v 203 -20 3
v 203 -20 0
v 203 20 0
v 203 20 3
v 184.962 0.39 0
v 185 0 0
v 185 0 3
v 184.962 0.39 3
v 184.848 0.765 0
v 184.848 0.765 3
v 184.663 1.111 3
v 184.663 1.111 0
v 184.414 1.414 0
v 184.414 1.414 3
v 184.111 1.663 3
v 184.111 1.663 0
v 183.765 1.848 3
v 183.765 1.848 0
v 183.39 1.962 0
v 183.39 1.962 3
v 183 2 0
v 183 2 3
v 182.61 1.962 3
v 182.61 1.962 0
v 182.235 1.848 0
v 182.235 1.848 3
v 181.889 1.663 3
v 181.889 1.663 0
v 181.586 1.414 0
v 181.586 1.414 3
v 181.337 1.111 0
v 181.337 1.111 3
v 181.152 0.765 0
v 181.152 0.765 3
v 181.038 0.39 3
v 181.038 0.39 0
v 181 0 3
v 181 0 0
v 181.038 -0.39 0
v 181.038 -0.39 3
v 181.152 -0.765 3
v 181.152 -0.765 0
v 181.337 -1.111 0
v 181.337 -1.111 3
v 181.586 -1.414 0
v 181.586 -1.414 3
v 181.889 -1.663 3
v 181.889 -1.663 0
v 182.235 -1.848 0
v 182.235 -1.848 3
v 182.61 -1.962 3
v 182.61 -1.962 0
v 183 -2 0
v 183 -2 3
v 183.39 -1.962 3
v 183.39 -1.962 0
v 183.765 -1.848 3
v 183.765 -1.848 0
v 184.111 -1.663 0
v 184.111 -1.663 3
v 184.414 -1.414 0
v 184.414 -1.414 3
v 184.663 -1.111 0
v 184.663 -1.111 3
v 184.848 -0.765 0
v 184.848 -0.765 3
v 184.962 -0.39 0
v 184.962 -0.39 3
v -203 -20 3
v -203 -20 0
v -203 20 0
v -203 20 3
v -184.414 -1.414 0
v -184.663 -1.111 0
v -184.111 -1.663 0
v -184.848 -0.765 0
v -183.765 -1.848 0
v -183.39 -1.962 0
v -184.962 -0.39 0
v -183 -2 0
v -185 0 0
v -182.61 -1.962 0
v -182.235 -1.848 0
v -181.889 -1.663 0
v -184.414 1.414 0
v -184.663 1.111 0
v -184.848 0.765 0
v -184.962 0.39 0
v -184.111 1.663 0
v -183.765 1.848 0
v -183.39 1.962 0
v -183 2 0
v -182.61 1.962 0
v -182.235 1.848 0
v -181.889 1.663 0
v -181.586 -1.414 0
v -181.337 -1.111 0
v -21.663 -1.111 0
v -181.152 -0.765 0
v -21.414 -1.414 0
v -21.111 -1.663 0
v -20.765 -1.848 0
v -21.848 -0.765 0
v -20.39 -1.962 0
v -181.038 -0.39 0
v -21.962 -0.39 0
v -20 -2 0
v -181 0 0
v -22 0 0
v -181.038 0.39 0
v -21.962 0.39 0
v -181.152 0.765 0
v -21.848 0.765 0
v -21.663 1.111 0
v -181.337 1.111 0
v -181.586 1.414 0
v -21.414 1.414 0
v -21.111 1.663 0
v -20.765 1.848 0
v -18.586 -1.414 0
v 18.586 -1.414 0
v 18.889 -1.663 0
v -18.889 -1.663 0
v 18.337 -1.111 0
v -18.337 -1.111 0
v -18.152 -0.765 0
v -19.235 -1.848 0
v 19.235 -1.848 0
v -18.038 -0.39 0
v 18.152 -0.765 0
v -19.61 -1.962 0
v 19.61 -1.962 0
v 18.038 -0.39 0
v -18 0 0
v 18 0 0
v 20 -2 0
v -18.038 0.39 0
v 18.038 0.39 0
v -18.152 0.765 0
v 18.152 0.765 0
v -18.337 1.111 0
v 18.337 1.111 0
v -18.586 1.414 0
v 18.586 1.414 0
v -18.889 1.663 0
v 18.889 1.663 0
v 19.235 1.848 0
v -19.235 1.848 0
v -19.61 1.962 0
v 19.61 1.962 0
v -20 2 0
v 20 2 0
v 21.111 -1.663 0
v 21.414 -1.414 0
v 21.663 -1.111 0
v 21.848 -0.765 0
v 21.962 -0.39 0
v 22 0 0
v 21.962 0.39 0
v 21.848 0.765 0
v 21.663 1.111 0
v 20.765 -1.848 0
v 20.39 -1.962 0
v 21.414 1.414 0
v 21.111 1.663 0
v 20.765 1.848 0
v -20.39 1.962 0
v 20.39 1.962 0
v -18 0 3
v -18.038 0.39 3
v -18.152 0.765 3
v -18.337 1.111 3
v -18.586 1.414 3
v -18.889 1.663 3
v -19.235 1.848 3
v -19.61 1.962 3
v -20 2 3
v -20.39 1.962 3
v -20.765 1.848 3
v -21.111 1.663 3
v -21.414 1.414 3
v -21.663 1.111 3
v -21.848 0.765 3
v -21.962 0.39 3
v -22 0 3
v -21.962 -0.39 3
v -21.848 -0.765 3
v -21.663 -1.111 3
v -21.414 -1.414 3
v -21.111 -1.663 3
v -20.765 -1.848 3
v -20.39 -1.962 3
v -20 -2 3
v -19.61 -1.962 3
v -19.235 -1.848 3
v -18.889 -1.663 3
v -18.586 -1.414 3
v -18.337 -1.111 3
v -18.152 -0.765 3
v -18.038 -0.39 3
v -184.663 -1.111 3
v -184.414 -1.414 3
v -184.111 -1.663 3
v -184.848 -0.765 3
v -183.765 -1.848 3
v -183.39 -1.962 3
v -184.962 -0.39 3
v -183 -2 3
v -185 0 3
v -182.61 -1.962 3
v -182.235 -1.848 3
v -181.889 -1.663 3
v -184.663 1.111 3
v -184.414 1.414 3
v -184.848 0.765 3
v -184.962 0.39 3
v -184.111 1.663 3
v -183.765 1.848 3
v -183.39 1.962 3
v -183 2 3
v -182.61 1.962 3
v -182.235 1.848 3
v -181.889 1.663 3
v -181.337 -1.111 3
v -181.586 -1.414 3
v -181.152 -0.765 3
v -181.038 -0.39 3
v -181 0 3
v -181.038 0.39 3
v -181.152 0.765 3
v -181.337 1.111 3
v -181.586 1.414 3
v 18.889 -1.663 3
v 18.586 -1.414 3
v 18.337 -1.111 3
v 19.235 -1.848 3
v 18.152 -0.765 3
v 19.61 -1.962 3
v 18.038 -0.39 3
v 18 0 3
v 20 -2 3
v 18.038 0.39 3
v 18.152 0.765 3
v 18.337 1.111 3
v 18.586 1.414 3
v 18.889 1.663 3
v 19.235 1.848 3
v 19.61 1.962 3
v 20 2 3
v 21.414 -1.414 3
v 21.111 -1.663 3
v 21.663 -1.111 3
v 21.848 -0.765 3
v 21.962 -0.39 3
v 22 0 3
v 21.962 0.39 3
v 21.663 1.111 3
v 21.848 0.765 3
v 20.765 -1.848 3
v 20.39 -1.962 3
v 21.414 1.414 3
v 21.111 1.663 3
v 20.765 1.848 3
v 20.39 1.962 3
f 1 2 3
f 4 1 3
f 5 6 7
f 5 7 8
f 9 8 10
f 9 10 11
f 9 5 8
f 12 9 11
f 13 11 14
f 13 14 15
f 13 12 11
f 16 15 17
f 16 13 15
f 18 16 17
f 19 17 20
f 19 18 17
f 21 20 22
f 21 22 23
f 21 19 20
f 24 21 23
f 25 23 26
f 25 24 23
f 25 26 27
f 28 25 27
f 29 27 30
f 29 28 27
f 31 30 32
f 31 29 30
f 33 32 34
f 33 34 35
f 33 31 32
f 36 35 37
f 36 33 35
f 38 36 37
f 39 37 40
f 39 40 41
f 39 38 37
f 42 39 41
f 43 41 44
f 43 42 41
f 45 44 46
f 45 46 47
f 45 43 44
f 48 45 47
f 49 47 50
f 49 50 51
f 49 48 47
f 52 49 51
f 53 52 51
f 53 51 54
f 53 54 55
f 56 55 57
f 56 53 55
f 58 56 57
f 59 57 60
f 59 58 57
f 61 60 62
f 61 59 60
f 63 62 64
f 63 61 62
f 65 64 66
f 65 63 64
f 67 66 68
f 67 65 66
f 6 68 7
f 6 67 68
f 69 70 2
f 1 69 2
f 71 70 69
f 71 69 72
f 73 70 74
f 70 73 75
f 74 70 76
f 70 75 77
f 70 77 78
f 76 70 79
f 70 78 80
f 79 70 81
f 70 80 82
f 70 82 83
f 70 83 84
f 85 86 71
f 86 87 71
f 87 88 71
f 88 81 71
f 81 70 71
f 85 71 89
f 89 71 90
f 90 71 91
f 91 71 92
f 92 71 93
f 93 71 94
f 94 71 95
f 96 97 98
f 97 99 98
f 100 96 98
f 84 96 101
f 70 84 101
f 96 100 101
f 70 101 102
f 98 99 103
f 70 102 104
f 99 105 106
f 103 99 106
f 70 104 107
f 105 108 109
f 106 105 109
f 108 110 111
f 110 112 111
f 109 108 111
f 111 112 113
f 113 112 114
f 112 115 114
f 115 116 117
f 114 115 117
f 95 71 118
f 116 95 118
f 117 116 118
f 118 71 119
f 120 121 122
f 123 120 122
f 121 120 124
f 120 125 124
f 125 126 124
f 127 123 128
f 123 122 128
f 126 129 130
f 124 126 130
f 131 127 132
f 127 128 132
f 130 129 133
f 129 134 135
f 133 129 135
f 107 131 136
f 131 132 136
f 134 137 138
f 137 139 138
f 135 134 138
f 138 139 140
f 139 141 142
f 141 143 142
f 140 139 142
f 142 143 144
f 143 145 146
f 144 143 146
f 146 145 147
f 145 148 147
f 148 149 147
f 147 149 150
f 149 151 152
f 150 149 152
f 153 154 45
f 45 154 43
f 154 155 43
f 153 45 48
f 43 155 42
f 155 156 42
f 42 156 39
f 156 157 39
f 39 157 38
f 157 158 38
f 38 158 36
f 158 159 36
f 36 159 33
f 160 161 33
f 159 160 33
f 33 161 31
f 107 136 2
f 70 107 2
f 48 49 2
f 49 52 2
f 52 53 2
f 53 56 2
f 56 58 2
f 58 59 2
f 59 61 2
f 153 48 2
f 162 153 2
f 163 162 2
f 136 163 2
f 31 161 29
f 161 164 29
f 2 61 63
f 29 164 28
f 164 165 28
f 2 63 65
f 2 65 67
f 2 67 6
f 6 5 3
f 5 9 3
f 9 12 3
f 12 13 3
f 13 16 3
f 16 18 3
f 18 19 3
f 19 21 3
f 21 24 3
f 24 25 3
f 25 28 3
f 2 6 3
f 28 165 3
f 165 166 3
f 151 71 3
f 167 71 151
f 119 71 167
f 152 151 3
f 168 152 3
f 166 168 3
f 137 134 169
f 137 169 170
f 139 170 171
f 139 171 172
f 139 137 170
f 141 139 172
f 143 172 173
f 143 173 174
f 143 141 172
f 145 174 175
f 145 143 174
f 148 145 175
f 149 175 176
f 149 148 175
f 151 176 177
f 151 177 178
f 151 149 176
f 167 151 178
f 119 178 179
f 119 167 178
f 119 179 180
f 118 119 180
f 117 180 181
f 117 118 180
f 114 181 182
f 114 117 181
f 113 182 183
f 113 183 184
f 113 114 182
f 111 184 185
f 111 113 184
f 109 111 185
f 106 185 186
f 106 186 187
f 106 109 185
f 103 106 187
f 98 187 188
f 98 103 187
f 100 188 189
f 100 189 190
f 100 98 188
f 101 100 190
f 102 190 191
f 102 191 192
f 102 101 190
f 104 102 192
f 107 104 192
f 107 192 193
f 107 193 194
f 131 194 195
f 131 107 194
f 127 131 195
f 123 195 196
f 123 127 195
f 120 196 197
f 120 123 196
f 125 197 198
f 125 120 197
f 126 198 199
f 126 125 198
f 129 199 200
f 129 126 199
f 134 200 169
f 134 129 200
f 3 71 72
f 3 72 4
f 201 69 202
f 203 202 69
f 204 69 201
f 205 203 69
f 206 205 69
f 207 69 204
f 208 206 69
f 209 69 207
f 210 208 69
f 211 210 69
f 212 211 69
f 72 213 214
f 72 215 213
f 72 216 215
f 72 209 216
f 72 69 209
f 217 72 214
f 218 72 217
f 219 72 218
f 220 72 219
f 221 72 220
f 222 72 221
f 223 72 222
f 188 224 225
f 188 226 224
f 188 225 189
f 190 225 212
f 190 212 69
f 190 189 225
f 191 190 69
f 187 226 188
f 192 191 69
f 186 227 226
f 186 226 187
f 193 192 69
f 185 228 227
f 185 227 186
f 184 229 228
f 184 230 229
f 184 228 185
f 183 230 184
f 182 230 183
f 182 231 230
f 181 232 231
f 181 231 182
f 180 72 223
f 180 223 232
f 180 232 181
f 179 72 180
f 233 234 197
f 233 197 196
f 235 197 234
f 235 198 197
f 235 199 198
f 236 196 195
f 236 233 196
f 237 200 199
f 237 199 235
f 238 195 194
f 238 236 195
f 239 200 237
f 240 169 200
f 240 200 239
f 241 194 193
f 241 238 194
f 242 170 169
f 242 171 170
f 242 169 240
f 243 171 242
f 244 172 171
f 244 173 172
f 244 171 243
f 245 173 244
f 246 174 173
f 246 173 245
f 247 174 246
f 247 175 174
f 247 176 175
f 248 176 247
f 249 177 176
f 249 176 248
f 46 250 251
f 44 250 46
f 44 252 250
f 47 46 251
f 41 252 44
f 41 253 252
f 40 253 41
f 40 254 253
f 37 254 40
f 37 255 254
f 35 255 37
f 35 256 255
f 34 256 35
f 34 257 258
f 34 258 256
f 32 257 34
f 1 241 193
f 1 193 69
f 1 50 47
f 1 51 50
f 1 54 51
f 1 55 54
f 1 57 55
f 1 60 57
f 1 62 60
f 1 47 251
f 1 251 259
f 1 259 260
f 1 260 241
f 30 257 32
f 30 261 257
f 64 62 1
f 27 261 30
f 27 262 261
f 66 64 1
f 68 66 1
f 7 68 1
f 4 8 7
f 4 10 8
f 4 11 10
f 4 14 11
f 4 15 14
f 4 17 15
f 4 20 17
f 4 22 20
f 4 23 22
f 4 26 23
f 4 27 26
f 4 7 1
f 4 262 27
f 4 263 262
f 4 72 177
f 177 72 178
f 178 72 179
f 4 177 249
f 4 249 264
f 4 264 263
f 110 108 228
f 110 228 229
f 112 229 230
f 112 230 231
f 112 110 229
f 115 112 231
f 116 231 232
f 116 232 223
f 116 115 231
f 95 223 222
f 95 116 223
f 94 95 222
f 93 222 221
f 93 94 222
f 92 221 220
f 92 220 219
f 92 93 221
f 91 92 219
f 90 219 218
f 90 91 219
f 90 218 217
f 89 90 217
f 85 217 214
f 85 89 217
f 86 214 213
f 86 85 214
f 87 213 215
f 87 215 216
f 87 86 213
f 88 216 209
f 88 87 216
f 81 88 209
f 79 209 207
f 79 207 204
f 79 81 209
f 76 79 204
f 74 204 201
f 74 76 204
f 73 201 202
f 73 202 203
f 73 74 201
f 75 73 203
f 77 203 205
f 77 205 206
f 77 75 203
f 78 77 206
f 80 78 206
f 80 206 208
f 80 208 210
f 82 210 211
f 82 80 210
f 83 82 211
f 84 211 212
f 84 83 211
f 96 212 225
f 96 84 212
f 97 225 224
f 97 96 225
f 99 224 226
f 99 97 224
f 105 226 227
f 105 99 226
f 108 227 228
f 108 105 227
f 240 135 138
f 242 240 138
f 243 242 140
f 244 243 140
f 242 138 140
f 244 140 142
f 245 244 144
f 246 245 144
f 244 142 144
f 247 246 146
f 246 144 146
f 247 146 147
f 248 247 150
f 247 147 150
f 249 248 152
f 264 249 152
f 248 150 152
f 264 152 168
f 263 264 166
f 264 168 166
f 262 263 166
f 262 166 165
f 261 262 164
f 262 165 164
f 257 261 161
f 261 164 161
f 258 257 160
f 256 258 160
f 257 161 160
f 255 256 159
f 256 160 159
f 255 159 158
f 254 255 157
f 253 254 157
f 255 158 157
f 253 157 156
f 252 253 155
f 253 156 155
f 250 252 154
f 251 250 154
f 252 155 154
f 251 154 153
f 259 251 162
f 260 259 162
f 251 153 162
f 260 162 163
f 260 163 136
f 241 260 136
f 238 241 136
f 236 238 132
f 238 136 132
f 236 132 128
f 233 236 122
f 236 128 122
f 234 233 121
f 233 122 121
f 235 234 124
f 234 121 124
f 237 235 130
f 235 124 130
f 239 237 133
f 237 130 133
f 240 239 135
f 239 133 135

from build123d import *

# Parameters (mm, degrees)
F0_W     = 406
F0_H     = 40
F0_R     = 2
F1_DEPTH = 3


with BuildPart() as f1:
    # F0 (on Top) → F1 (new body)
    with BuildSketch(Plane.XY):
        Rectangle(F0_W, F0_H)
        with Locations((-183, 0)):
            Circle(F0_R, mode=Mode.SUBTRACT)
        with Locations((-20, 0)):
            Circle(F0_R, mode=Mode.SUBTRACT)
        with BuildLine():
            ThreePointArc((22, 0), (20, -2), (18, 0))
            ThreePointArc((18, 0), (20, 2), (22, 0))
        make_face(mode=Mode.SUBTRACT)
        with Locations((183, 0)):
            Circle(F0_R, mode=Mode.SUBTRACT)
    extrude(amount=F1_DEPTH)


solid = f1.part
